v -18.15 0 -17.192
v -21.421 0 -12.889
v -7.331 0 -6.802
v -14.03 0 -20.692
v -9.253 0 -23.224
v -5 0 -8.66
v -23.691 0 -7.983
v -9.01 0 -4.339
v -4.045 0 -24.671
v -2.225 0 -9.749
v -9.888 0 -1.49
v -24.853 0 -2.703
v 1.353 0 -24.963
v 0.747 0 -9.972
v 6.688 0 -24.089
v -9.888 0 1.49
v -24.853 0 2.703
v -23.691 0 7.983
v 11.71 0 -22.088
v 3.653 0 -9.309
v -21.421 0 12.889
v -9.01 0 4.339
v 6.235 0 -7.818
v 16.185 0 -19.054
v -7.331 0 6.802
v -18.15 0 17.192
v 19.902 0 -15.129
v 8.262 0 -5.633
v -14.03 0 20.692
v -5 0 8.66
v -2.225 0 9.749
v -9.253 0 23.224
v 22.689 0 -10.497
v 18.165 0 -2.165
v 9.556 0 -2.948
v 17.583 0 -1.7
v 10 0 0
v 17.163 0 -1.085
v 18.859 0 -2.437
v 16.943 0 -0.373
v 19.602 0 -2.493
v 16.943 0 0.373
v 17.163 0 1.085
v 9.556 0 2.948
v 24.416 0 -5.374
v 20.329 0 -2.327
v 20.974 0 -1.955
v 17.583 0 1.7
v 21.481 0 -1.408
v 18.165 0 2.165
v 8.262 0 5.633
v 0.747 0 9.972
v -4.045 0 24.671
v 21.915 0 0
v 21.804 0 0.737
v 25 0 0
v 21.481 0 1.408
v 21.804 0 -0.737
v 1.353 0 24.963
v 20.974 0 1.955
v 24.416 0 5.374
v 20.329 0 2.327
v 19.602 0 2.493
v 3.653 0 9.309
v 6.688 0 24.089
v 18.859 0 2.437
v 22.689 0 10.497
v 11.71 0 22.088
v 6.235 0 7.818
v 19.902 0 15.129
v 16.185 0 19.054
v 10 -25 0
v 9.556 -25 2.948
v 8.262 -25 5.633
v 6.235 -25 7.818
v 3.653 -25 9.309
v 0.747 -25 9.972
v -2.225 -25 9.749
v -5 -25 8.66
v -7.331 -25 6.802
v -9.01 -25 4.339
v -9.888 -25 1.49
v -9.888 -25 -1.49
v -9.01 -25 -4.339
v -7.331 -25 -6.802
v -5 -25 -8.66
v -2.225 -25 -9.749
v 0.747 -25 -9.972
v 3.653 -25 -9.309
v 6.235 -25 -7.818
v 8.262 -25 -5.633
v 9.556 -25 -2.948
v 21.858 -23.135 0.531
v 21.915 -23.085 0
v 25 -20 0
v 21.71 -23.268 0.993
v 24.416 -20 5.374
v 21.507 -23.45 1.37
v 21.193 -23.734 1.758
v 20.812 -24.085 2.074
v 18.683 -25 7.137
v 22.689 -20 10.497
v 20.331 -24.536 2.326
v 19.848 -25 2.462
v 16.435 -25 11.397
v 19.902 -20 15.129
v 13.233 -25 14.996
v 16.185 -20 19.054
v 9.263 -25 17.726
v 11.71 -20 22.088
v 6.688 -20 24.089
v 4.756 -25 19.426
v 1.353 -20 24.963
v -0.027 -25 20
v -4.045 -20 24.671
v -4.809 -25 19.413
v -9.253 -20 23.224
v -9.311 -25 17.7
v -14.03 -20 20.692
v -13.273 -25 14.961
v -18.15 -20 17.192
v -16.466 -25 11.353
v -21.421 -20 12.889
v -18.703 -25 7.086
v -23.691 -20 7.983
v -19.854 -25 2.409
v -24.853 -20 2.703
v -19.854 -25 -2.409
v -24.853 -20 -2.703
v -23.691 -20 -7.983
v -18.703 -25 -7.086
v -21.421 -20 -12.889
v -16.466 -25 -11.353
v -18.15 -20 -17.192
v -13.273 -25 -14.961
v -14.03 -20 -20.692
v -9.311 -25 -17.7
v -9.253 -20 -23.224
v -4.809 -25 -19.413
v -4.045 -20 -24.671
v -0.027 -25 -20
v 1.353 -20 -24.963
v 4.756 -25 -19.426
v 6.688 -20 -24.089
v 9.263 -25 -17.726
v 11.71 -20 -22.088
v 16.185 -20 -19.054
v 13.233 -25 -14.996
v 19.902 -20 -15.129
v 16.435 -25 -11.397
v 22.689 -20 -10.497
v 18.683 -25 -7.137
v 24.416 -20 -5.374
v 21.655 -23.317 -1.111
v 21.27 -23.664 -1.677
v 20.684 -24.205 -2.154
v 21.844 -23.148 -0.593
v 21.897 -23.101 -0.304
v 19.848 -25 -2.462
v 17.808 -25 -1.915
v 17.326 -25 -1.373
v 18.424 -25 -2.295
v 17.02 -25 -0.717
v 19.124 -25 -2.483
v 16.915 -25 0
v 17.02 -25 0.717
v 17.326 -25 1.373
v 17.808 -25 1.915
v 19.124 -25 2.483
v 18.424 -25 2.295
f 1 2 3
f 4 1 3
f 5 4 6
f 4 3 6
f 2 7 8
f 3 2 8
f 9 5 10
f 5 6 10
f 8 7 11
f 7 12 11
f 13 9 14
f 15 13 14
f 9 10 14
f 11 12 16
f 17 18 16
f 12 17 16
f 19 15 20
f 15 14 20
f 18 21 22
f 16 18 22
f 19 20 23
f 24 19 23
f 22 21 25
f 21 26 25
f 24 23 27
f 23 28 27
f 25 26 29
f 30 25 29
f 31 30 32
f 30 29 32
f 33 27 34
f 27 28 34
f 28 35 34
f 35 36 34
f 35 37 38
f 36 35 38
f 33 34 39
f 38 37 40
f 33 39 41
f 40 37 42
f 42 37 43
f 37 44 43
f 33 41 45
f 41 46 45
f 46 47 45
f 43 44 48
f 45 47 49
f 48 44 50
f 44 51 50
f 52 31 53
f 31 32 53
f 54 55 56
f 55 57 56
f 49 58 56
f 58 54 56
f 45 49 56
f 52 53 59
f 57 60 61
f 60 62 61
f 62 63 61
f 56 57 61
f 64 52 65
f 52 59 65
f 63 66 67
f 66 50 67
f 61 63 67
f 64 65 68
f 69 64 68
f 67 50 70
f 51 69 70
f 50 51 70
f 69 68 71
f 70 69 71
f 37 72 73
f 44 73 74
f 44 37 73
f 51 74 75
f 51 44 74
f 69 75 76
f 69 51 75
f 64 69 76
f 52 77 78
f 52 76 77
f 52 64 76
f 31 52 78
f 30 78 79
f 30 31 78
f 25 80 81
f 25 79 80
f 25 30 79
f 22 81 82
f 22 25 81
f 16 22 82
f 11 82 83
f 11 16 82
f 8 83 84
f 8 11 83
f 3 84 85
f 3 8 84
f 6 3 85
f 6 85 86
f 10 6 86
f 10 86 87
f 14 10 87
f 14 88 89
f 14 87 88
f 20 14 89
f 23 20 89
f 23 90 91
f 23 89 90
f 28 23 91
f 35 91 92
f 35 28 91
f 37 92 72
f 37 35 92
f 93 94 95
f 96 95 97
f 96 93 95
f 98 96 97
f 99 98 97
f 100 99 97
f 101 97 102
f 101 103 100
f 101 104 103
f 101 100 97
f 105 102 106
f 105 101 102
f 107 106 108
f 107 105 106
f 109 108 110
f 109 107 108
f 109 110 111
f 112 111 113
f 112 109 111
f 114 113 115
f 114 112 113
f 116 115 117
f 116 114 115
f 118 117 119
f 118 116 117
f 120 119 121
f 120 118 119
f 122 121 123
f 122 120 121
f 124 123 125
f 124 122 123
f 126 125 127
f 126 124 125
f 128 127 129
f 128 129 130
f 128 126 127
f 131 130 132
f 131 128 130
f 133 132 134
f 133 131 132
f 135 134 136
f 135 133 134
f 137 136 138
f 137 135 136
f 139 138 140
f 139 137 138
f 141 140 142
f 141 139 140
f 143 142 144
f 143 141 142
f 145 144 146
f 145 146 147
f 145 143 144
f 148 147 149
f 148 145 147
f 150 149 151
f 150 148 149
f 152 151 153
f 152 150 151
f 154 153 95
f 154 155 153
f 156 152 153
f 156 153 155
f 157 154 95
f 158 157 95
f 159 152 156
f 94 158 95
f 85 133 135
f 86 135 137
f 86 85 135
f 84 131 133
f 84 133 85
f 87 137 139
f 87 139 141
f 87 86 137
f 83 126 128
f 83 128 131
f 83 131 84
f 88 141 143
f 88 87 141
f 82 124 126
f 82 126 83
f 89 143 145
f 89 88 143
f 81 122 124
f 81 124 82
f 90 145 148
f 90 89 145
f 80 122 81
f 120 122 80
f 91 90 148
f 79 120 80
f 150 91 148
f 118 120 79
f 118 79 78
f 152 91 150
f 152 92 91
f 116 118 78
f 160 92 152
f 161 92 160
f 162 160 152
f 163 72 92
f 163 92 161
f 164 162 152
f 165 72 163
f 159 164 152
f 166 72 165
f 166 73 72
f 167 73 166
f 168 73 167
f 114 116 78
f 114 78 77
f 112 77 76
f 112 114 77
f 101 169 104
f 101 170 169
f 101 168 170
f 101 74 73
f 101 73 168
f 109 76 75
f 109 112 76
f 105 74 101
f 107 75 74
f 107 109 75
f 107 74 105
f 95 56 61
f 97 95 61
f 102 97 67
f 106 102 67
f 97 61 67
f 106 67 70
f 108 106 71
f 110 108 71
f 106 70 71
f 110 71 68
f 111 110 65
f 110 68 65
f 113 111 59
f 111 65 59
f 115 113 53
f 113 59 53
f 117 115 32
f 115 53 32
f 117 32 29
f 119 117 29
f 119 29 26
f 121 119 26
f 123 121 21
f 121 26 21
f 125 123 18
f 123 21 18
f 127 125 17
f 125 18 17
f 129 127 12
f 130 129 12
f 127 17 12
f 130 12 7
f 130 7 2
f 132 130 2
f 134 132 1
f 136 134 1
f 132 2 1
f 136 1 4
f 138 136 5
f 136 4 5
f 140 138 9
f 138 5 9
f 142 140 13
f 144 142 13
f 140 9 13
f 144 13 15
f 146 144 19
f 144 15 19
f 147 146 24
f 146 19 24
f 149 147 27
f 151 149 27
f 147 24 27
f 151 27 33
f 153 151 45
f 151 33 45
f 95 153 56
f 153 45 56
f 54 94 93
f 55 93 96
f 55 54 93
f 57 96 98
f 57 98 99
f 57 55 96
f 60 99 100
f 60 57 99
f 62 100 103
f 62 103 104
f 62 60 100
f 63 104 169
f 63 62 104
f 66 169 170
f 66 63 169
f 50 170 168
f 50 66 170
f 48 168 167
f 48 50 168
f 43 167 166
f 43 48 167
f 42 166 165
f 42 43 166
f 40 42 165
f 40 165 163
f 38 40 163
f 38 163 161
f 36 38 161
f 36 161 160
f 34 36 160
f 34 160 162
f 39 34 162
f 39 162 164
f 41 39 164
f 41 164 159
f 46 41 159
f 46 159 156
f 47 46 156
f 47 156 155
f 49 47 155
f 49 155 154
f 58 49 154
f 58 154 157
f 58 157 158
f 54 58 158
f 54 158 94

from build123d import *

# Parameters (mm, degrees)
F0_R     = 25
F1_DEPTH = 25
F2_R     = 10
F3_DEPTH = 50
F4_SIZE  = 5
F5_R     = 2.5
F6_DEPTH = 25


with BuildPart() as f1:
    # F0 (on Front) → F1 (new body)
    with BuildSketch(Plane.XZ):
        Circle(F0_R)
    extrude(amount=F1_DEPTH)

    # F2 (on Front) → F3 (cut)
    with BuildSketch(Plane.XZ):
        Circle(F2_R)
    extrude(amount=F3_DEPTH, mode=Mode.SUBTRACT)

    # F4
    f4_edges = [f1.edges().sort_by_distance(p)[0] for p in [
        (-25, -25, 0),
    ]]
    chamfer(f4_edges, length=F4_SIZE)

    # F5 (on Front) → F6 (cut)
    with BuildSketch(Plane.XZ):
        with Locations((19.415321, 0)):
            Circle(F5_R)
    extrude(amount=F6_DEPTH, mode=Mode.SUBTRACT)


solid = f1.part
